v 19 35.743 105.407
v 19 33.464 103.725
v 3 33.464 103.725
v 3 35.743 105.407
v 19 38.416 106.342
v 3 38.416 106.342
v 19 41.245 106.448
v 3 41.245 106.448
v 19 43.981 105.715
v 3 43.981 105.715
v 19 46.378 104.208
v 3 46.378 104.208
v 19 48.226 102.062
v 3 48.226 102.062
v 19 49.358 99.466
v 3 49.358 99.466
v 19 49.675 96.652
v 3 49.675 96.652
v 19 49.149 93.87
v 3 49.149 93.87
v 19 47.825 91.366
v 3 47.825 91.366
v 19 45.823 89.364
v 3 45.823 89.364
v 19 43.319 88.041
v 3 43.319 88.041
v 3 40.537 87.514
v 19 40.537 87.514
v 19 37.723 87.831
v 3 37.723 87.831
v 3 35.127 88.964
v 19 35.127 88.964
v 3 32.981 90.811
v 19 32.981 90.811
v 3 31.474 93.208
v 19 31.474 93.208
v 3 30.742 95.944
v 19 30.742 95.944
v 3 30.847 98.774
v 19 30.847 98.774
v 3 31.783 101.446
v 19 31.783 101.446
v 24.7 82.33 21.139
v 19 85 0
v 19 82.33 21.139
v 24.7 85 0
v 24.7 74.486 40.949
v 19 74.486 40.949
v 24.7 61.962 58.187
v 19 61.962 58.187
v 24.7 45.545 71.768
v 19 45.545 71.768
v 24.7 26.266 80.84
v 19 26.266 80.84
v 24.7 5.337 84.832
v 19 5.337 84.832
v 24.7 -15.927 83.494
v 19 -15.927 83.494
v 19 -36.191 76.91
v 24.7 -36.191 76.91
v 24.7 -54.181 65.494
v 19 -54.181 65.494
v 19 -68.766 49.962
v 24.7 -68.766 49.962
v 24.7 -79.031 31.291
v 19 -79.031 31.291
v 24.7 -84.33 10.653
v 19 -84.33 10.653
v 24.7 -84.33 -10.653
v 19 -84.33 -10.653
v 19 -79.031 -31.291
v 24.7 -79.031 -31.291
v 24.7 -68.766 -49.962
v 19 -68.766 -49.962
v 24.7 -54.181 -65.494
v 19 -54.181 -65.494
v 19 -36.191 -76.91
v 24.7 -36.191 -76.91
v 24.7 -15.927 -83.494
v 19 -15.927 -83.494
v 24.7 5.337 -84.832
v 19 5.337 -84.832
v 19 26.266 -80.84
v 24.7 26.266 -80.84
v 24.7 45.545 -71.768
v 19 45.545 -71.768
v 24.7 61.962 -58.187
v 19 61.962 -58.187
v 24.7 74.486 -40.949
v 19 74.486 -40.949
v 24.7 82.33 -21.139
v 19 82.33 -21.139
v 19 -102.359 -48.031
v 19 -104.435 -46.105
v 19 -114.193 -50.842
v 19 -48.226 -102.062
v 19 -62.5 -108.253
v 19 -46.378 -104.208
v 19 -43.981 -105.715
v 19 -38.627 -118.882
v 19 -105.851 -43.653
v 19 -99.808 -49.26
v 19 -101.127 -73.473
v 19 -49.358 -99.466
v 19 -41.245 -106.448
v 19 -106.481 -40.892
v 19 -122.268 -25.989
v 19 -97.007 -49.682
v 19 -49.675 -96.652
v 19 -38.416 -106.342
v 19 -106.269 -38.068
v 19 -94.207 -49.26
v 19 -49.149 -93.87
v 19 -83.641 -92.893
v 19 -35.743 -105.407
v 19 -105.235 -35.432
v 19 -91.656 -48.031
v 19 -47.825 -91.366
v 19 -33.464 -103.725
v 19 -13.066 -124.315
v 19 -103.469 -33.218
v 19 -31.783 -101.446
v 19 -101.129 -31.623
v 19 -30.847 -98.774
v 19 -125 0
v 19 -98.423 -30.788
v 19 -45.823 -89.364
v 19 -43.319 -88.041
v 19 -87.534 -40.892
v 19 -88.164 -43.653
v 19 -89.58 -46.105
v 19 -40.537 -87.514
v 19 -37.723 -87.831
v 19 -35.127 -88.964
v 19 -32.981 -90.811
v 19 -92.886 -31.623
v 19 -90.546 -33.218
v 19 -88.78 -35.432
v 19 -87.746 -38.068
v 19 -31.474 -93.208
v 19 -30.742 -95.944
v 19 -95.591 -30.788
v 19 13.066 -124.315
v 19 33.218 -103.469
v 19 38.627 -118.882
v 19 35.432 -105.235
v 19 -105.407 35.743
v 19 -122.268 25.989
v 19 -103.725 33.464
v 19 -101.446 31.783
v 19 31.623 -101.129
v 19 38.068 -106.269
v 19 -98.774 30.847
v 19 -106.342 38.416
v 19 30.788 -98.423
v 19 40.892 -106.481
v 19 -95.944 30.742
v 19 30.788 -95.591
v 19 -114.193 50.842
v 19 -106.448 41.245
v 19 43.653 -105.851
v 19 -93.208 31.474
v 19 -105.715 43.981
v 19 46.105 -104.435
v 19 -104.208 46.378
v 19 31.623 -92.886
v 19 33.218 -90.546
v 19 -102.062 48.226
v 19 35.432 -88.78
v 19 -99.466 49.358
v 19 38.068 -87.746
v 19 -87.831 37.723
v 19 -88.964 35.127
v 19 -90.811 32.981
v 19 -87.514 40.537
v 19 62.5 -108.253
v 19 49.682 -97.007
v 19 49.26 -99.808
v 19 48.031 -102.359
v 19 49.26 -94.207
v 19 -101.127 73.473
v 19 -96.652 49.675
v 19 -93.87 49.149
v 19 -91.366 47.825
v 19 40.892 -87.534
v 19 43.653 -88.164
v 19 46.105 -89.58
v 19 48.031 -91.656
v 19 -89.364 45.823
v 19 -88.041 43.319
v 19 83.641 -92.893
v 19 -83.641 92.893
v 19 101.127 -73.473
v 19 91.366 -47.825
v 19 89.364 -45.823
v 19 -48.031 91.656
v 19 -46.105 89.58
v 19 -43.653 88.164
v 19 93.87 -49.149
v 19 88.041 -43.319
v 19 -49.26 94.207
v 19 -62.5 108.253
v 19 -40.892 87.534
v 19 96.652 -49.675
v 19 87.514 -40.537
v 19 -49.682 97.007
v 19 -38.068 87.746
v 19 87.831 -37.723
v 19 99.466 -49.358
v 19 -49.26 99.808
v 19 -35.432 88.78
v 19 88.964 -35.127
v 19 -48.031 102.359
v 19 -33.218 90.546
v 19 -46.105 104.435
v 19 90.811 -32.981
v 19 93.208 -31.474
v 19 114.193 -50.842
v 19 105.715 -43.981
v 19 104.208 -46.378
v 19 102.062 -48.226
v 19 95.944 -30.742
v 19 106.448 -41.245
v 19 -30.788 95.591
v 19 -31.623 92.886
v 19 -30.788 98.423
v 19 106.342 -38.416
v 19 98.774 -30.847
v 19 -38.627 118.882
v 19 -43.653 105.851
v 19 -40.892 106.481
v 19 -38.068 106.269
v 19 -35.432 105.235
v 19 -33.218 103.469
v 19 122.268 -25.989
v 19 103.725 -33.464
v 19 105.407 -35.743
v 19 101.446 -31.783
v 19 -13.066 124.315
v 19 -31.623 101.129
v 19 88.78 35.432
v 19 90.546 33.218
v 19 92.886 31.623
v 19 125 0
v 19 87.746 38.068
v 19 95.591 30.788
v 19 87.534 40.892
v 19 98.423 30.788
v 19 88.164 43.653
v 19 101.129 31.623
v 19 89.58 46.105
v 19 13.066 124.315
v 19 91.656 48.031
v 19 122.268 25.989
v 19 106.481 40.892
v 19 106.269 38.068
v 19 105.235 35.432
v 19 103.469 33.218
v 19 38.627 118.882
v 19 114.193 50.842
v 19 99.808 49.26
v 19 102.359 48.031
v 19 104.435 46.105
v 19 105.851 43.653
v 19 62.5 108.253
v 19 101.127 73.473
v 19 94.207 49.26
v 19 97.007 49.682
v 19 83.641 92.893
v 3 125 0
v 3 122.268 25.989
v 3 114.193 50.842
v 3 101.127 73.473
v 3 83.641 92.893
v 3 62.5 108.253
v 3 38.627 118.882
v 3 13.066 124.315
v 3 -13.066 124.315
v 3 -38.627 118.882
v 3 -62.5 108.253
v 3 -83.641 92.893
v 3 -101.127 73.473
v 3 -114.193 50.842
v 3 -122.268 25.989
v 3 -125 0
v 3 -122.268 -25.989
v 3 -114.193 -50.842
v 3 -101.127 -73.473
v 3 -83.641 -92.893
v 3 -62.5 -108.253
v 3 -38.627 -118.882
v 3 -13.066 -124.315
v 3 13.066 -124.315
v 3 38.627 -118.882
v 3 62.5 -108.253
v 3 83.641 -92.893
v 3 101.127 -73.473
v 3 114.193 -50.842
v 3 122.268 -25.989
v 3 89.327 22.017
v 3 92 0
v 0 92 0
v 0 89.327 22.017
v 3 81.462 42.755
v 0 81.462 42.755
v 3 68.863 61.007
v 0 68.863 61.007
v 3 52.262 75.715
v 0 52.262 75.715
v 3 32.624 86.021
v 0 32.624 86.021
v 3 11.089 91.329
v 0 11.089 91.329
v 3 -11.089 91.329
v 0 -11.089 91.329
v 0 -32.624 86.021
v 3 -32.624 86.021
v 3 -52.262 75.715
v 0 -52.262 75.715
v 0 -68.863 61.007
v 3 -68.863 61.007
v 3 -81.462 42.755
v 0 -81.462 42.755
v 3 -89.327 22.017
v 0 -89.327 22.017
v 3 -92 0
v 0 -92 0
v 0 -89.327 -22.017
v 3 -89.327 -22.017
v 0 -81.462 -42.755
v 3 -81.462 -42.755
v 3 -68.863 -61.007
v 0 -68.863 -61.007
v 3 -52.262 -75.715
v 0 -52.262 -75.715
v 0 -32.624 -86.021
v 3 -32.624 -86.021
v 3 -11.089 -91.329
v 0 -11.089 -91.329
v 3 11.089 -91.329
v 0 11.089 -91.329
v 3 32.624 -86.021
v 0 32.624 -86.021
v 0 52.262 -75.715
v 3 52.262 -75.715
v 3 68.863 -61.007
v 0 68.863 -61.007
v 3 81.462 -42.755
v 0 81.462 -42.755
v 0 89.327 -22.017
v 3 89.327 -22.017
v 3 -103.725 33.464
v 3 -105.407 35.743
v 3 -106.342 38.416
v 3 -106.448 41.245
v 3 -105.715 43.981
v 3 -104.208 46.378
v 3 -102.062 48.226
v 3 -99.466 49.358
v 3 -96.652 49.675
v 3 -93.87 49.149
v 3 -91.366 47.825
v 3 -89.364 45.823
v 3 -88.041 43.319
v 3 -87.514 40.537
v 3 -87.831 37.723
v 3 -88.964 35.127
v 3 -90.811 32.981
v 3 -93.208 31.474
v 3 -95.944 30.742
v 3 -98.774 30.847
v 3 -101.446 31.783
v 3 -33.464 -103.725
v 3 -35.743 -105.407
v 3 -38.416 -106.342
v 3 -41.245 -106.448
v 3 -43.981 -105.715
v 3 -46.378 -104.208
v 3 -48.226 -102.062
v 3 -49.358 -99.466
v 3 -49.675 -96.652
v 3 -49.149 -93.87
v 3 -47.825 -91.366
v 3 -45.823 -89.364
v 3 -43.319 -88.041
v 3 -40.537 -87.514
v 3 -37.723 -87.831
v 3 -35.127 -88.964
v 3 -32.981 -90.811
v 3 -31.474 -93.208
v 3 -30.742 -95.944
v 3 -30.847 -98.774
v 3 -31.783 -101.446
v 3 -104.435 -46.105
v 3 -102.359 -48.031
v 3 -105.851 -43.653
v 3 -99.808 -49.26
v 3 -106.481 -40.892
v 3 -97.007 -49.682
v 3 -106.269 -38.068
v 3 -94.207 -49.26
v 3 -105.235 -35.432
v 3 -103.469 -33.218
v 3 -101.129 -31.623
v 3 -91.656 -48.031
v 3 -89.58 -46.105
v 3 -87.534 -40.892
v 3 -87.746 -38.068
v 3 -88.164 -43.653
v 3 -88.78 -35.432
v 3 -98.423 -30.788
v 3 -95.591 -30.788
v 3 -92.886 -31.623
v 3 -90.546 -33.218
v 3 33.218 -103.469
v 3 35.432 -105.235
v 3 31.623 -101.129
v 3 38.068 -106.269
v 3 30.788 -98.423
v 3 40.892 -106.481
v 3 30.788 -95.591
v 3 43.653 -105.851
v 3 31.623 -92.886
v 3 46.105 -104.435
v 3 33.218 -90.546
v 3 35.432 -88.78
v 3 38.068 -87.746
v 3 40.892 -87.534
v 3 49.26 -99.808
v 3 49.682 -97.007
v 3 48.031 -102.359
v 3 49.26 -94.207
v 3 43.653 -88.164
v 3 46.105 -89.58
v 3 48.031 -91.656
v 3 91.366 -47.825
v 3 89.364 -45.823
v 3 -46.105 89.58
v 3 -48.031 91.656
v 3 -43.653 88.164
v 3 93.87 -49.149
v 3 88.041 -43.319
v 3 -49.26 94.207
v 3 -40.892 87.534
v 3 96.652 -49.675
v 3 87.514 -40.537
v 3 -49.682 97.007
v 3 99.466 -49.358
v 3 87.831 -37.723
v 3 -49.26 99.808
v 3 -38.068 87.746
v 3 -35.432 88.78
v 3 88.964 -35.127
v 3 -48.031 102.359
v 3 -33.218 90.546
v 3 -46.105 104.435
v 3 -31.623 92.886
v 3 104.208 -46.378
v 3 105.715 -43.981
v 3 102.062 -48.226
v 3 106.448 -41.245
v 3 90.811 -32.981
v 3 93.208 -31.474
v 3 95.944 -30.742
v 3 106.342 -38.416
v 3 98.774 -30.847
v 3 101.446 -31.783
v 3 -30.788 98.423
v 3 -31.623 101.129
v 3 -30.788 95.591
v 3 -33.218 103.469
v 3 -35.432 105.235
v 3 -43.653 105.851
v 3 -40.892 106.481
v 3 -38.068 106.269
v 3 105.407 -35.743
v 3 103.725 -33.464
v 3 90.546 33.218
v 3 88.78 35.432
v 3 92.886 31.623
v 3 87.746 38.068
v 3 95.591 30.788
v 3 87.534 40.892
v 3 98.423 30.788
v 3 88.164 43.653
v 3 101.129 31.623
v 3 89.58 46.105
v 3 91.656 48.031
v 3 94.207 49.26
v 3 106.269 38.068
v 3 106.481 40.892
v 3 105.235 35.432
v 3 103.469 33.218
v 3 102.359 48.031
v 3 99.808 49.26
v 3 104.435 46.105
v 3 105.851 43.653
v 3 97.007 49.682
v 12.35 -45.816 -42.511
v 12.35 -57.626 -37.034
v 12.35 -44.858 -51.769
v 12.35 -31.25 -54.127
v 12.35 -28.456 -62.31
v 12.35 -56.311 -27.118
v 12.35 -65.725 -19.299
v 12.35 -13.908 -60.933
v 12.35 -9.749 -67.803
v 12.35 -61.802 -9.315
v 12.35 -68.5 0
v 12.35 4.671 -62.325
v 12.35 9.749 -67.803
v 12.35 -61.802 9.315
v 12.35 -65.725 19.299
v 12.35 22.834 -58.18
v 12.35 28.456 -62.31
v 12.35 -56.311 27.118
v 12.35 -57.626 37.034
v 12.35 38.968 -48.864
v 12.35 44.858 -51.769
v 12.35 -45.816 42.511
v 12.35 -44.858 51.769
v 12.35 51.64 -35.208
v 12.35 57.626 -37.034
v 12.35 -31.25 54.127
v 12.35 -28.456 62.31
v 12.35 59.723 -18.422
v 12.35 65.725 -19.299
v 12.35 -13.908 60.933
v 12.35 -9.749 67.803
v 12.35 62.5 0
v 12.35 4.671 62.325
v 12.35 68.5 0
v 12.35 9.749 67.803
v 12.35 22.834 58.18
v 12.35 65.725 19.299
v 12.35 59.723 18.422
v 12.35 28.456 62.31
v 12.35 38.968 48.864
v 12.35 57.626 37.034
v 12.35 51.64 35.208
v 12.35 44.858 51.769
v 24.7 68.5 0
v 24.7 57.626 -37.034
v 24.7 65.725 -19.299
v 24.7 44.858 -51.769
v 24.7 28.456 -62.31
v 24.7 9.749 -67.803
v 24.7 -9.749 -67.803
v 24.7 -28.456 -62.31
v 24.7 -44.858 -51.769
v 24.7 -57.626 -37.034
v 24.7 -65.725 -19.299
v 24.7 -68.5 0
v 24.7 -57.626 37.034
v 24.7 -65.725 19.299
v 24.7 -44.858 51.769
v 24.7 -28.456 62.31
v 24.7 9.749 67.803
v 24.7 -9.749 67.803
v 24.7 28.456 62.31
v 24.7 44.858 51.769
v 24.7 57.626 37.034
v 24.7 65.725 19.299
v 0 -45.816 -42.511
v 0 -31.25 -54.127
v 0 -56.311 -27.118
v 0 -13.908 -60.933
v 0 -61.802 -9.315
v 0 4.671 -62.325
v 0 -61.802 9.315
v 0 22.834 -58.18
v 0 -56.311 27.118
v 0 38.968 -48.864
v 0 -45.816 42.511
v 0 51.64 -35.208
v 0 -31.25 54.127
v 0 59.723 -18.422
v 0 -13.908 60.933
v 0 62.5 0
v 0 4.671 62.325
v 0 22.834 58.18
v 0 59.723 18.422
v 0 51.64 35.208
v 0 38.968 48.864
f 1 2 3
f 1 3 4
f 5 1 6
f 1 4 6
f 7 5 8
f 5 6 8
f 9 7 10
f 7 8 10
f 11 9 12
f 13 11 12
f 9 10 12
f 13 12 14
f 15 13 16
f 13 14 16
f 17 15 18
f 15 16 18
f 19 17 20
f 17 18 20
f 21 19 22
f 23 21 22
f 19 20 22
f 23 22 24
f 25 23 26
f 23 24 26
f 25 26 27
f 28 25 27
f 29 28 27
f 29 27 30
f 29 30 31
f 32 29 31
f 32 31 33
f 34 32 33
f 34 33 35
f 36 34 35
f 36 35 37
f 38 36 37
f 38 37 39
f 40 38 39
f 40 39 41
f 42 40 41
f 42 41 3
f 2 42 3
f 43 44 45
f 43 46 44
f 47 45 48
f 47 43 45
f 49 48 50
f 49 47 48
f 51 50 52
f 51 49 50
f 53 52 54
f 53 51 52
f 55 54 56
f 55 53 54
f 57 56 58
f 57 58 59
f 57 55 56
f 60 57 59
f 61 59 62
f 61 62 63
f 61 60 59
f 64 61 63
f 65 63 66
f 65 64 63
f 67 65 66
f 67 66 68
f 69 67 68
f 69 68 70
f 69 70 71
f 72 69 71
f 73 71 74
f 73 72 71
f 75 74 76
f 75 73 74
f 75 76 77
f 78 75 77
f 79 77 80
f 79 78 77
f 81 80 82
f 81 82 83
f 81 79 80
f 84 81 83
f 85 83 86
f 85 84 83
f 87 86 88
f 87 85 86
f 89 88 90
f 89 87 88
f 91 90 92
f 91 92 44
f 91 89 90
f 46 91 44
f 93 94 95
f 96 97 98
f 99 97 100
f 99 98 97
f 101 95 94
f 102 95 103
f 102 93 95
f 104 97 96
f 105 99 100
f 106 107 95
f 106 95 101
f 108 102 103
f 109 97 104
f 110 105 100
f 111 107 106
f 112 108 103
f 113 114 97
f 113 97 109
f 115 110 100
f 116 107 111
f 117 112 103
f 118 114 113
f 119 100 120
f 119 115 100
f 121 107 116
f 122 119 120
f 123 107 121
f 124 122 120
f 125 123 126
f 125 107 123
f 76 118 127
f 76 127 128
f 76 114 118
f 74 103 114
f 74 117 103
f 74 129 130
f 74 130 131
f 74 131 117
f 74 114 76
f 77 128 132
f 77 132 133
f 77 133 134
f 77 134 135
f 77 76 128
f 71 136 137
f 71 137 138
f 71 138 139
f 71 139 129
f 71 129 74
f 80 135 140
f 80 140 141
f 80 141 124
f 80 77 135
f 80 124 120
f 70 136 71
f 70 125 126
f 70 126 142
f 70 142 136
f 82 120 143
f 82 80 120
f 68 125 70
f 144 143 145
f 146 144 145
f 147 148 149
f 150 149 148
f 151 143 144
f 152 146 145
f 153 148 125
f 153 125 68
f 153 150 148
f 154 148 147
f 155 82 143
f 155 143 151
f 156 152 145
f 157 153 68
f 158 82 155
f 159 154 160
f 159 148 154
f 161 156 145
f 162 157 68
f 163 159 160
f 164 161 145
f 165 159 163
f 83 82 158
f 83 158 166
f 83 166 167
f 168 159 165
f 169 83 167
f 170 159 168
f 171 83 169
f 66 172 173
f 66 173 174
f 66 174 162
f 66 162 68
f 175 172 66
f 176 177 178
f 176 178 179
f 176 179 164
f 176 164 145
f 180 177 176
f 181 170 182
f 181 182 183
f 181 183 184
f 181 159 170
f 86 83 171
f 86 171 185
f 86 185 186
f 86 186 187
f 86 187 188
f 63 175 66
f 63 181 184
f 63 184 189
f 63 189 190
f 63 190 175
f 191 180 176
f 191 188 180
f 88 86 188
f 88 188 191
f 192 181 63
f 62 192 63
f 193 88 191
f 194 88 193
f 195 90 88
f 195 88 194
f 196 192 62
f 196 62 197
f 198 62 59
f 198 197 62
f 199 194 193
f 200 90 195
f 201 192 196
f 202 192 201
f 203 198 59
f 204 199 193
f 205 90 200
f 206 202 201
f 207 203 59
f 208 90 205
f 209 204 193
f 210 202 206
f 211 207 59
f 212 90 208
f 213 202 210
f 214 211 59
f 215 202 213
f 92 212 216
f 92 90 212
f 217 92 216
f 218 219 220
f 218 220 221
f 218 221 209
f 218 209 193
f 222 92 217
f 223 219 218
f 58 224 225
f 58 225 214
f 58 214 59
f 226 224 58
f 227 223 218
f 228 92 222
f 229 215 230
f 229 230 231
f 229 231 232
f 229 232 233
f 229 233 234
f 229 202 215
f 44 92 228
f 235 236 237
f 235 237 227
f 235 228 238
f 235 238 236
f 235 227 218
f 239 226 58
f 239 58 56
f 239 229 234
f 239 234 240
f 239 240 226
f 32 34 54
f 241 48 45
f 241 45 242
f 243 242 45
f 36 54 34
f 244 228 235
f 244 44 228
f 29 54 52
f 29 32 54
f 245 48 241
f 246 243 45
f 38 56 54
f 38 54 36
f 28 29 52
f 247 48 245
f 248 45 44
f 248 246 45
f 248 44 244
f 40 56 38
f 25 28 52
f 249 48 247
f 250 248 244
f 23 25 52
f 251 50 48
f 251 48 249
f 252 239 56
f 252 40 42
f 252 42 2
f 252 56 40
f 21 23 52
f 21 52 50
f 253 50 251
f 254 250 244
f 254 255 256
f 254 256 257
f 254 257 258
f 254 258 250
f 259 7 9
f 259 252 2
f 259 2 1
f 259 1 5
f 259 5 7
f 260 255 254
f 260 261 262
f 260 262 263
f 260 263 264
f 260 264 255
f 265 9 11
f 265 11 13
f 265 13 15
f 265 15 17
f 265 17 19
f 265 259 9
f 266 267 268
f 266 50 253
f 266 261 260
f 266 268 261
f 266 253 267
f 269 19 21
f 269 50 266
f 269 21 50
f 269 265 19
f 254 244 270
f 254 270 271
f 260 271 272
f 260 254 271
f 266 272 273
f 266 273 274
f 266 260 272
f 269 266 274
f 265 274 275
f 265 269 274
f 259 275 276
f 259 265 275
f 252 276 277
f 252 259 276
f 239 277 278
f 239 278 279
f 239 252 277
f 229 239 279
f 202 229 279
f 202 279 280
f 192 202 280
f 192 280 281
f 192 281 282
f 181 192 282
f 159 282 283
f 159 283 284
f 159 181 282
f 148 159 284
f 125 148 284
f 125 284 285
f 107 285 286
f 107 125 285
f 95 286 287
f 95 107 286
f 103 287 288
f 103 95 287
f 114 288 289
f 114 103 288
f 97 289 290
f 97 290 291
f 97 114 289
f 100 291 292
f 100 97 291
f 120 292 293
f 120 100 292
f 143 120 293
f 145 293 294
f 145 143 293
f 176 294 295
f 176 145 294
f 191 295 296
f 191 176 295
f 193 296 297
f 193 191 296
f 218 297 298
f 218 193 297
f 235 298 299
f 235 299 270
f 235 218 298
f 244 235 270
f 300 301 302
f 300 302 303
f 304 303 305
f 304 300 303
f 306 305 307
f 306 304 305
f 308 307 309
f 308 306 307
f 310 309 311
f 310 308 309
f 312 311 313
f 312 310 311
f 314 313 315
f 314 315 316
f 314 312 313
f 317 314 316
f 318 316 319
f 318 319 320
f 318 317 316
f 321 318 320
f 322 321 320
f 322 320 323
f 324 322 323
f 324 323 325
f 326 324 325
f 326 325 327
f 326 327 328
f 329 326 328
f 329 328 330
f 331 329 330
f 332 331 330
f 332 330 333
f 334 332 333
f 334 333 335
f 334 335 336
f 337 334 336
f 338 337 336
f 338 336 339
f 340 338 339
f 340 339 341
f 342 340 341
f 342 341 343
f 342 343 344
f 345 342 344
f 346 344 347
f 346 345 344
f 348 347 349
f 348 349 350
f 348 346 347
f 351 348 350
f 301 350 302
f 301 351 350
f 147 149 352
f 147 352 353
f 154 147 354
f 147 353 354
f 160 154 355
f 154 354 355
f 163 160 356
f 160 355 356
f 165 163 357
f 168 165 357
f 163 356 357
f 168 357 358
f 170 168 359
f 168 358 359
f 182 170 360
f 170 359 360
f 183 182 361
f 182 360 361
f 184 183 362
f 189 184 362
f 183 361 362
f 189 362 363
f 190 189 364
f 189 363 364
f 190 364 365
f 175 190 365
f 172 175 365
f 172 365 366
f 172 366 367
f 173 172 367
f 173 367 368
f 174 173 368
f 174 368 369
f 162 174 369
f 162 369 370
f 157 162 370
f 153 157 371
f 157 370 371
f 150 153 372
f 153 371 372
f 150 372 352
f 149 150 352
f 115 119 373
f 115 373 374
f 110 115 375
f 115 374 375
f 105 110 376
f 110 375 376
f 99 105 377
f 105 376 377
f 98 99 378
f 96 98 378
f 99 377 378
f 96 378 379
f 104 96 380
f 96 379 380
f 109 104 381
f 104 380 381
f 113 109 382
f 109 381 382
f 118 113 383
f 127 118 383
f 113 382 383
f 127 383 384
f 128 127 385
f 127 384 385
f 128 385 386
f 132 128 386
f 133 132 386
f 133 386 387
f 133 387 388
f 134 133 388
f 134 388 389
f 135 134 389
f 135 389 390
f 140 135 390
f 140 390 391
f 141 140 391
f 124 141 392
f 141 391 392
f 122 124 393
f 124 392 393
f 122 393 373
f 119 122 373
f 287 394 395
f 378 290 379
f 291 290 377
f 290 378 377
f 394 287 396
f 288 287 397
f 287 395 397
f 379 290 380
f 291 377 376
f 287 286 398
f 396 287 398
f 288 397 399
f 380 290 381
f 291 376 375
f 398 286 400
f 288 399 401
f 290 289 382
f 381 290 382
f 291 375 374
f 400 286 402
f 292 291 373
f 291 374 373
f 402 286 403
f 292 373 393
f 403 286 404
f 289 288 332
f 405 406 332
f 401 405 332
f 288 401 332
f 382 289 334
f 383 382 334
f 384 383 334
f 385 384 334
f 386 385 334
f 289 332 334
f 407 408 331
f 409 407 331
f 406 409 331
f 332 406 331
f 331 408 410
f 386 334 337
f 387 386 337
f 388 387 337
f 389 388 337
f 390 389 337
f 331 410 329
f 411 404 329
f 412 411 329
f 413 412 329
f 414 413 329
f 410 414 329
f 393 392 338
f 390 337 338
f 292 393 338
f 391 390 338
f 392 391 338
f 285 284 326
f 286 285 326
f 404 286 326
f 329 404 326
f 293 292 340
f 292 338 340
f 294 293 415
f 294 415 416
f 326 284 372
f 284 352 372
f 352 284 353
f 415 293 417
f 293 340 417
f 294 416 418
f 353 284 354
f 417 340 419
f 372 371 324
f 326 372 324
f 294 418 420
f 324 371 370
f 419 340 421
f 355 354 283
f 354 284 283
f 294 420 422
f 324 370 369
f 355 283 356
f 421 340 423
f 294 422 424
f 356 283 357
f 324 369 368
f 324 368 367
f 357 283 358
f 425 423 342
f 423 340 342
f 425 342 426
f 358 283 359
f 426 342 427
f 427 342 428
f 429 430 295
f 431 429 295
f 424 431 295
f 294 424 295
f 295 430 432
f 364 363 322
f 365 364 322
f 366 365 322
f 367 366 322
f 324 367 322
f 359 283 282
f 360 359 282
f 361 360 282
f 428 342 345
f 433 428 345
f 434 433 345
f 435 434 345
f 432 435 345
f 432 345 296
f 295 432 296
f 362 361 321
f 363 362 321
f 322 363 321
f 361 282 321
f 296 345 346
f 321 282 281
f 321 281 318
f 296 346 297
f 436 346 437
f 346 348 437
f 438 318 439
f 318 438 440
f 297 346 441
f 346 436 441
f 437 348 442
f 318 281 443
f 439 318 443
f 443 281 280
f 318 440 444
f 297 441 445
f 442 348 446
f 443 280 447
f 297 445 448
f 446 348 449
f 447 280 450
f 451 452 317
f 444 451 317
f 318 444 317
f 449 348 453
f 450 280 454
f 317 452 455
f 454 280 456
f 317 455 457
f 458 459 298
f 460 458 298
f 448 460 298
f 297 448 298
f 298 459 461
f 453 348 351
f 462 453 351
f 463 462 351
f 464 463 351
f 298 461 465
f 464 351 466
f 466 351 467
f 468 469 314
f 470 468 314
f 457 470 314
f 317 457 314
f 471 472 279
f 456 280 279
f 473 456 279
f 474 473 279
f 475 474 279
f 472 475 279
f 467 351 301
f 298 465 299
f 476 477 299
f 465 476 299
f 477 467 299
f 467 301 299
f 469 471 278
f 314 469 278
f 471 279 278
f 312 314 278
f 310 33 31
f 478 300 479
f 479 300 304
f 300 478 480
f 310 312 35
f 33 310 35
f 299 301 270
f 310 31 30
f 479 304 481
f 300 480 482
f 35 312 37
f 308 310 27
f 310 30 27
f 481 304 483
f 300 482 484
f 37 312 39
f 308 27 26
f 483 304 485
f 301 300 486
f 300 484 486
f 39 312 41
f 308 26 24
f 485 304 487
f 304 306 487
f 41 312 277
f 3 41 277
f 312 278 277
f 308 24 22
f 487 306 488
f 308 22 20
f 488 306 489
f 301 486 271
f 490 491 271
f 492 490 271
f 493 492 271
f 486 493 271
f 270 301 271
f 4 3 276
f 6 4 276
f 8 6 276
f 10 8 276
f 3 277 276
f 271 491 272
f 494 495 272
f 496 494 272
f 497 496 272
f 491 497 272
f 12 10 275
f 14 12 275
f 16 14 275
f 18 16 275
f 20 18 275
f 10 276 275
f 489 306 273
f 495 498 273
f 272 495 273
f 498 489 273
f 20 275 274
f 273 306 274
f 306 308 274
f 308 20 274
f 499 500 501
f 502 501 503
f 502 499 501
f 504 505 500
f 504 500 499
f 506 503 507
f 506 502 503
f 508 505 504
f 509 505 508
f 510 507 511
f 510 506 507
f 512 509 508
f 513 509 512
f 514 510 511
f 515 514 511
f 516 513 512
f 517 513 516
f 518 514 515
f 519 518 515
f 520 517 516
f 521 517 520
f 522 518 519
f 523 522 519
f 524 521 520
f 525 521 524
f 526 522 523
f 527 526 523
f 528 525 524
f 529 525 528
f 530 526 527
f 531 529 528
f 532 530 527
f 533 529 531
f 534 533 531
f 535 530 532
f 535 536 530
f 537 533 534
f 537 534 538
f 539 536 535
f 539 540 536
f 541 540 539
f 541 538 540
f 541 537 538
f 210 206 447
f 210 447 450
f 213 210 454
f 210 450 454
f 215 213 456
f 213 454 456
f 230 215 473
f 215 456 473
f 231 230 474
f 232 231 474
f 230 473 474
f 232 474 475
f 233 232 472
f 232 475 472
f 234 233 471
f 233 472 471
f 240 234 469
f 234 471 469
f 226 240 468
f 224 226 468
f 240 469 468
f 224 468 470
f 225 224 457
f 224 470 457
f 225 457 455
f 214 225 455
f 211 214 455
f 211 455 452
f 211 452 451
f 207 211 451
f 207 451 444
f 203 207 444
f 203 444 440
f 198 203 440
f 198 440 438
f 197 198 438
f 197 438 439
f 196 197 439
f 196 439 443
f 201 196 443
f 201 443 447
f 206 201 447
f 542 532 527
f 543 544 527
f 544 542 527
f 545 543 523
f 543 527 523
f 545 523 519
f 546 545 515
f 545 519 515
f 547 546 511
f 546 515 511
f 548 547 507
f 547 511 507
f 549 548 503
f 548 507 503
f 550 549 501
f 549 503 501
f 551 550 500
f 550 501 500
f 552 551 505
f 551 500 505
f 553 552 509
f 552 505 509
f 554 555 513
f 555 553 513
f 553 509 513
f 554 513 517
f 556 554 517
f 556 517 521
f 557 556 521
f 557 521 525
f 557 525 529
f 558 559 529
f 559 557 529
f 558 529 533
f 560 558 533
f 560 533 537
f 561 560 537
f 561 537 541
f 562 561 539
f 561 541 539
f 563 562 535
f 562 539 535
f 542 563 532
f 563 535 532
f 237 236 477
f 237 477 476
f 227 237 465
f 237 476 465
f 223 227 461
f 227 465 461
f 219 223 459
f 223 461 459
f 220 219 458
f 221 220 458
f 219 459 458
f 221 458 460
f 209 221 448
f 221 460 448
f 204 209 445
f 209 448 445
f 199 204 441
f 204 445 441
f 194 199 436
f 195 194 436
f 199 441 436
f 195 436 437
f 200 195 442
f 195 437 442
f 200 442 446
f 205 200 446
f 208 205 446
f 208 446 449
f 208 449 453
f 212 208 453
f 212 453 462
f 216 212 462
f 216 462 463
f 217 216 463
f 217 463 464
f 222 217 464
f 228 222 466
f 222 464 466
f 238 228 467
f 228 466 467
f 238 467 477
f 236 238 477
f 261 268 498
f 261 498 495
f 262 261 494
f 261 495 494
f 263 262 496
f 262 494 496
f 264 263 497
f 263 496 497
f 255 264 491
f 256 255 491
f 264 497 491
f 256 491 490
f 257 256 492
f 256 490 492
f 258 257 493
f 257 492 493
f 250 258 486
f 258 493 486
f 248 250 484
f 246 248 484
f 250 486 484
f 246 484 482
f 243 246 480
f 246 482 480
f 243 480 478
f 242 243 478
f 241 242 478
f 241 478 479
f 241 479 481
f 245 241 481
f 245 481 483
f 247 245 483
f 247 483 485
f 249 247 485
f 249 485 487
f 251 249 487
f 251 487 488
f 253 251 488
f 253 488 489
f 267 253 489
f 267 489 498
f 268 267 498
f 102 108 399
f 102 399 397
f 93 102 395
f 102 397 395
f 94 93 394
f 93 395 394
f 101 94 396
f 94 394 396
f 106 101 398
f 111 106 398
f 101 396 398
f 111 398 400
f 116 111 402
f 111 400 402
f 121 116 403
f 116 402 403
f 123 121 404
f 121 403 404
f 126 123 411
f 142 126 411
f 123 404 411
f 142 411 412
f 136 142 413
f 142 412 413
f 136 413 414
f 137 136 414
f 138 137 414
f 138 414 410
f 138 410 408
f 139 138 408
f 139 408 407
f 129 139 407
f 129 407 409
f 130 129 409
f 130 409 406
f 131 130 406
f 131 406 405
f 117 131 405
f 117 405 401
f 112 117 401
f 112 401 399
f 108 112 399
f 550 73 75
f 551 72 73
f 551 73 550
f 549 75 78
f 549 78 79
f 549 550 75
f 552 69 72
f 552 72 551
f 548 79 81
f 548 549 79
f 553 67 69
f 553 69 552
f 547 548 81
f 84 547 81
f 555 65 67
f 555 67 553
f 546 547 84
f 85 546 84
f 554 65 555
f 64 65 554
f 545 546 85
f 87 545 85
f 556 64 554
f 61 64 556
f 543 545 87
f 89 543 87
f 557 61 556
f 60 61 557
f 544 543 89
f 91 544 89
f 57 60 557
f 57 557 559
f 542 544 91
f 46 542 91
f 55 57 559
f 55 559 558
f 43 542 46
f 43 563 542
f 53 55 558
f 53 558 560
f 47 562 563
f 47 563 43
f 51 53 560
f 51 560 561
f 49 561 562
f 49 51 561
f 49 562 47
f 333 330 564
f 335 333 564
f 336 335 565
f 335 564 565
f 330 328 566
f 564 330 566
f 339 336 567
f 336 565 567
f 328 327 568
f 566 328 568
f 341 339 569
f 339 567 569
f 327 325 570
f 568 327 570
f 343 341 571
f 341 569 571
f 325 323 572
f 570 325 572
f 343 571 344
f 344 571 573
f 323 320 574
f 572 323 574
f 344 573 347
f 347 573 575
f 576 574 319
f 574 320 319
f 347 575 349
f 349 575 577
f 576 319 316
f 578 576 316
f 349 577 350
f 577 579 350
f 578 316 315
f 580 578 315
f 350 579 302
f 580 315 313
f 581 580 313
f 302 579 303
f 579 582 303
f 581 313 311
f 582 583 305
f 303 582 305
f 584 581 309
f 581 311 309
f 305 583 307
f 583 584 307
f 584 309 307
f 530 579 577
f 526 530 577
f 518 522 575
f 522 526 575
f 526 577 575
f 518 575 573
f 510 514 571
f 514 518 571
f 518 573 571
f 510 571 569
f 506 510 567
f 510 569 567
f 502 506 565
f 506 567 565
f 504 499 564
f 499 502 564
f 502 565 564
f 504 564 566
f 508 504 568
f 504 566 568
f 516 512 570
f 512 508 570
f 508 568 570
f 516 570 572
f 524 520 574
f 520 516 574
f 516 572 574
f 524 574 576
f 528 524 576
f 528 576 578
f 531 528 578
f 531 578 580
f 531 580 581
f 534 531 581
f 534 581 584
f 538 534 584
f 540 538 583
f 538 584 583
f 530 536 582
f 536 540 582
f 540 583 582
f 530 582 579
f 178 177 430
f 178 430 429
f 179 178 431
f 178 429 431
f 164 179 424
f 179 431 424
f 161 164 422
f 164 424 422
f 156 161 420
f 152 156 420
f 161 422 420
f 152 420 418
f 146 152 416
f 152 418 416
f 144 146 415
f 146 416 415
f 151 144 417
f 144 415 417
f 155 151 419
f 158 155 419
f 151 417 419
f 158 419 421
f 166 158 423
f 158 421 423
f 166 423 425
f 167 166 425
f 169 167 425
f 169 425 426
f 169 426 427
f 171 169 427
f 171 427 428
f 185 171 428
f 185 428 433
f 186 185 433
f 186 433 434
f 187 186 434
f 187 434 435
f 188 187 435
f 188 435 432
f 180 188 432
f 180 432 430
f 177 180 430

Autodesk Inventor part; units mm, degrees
ref_plane "YZ Plane" through (0, 0, 0) normal (1, 0, 0) x (0, 1, 0)
ref_plane "XZ Plane" through (0, 0, 0) normal (0, 1, 0) x (-1, 0, 0)
ref_plane "XY Plane" through (0, 0, 0) normal (0, 0, 1) x (1, 0, 0)
sketch "Sketch1" plane through (0, 0, 0) normal (0, 0, 1) x (1, 0, 0)
  line L0 (0, 0) -> (24.7, 0) construction
  line L1 (0, 92) -> (3, 92)
  line L2 (3, 125) -> (19, 125)
  line L3 (3, 125) -> (3, 92)
  line L4 (19, 125) -> (19, 85)
  line L5 (24.7, 68.5) -> (24.7, 0) construction
  line L6 (19, 85) -> (24.7, 85)
  line L7 (24.7, 85) -> (24.7, 68.5)
  line L8 (24.7, 68.5) -> (12.35, 68.5)
  line L9 (12.35, 68.5) -> (12.35, 62.5)
  line L10 (12.35, 62.5) -> (0, 62.5)
  line L11 (0, 62.5) -> (0, 0) construction
  line L12 (0, 92) -> (0, 62.5)
  dimension "d0" = 184
  dimension "d1" = 250
  dimension "d2" = 170
  dimension "d7" = 137
  dimension "d8" = 125
  dimension "d9" = 19
  dimension "d10" = 3
  dimension "d12" = 12.35
  dimension "d13" = 24.7
revolve "Revolution1" add sketch "Sketch1" angle 360 about axis through (0, 0, 0) along (1, 0, 0)
sketch "Sketch2" plane through (3, 0, 0) normal (-1, 0, 0) x (0, 0, 1)
  circle A0 centre (0, 0) radius 92 projected
  line L0 (0, 0) -> (0, 105) construction
  circle A1 centre (0, 0) radius 125 projected
  circle A2 centre (0, 0) radius 105 construction
  line L1 (0, 0) -> (40.1818, 97.0074) construction
  circle A3 centre (40.1818, 97.0074) radius 9.5
  dimension "d14" = 19
  dimension "d15" = 105
  dimension "d16" = 22.5
extrude "Extrusion1" cut sketch "Sketch2" against normal blind 19 contours A3
pattern_circular "Circular Pattern1" count 8 over 360 about axis through (1.5, 0, 0) along (1, 0, 0) of "Extrusion1"
equation "\"d0\" = D1"
equation "\"d1\" = D"
equation "\"d2\" = N3"
equation "\"d7\" = ID + 2 * t"
equation "\"d8\" = ID"
equation "\"d9\" = C1"
equation "\"d10\" = F1"
equation "\"d12\" = 0.65 * C1"
equation "\"d13\" = 1.3 * C1"
equation "\"d14\" = L"
equation "\"d15\" = 0.5 * K1"
equation "\"d3\" = C1"
equation "\"C1\" = 19"
equation "\"D\" = 250"
equation "\"L\" = 19"
equation "\"N3\" = 170"
equation "\"D1\" = 184"
equation "\"H1\" = 17"
equation "\"F1\" = 3"
equation "\"ID\" = 125"
equation "\"t\" = 6"
equation "\"Size_Designation\" = 1.2345"
equation "\"K1\" = 210"
properties part number "DIN EN 1092-2 Hubbed Socket Welding Flange Type 14 - PN 16 Ductile Iron DN125" material "Iron, Ductile"
